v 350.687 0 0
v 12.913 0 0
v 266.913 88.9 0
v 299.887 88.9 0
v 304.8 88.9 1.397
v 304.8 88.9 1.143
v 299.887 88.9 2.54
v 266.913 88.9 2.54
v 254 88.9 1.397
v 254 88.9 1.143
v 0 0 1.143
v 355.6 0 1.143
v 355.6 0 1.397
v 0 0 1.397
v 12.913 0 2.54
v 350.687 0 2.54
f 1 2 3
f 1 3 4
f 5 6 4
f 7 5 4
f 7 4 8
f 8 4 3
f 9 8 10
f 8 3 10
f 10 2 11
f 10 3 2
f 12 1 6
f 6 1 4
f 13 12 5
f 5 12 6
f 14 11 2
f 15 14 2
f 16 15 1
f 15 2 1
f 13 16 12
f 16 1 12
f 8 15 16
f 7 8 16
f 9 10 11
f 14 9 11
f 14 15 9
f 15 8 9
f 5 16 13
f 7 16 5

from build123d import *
from OCP.BRepFilletAPI import BRepFilletAPI_MakeChamfer

# Parameters (mm, degrees)
BOSS_EXTRUDE1_DEPTH = 2.54
CHAMFER2_SIZE       = 1.143
CHAMFER2_SIZE2      = 4.265734073


with BuildPart() as part:
    # Sketch1 → Boss-Extrude1 (new body)
    with BuildSketch(Plane.XY):
        Polygon((0, 0), (355.6, 0), (304.8, 88.9), (254, 88.9), align=None)
    extrude(amount=BOSS_EXTRUDE1_DEPTH)

    # Chamfer2: one chamfer whose edges measure the first distance from different faces: ONE call of the kernel's chamfer builder (chamfer() names one face for all edges)
    chamfer2_edges_1 = [part.edges().sort_by_distance(p)[0] for p in [
        (330.2, 44.45, 2.54),
        (330.2, 44.45, 0),
    ]]
    chamfer2_side_1 = [part.faces().sort_by_distance(p)[0] for p in [
        (330.2, 44.45, 1.27),
    ]]
    chamfer2_edges_2 = [part.edges().sort_by_distance(p)[0] for p in [
        (127, 44.45, 2.54),
        (127, 44.45, 0),
    ]]
    chamfer2_side_2 = [part.faces().sort_by_distance(p)[0] for p in [
        (127, 44.45, 1.27),
    ]]
    chamfer2 = BRepFilletAPI_MakeChamfer(part.part.solid().wrapped)
    for e in chamfer2_edges_1:
        chamfer2.Add(CHAMFER2_SIZE, CHAMFER2_SIZE2, e.wrapped, chamfer2_side_1[0].wrapped)  # the first distance lies on this face
    for e in chamfer2_edges_2:
        chamfer2.Add(CHAMFER2_SIZE, CHAMFER2_SIZE2, e.wrapped, chamfer2_side_2[0].wrapped)  # the first distance lies on this face
    add(Compound.cast(chamfer2.Shape()), mode=Mode.REPLACE)


solid = part.part
